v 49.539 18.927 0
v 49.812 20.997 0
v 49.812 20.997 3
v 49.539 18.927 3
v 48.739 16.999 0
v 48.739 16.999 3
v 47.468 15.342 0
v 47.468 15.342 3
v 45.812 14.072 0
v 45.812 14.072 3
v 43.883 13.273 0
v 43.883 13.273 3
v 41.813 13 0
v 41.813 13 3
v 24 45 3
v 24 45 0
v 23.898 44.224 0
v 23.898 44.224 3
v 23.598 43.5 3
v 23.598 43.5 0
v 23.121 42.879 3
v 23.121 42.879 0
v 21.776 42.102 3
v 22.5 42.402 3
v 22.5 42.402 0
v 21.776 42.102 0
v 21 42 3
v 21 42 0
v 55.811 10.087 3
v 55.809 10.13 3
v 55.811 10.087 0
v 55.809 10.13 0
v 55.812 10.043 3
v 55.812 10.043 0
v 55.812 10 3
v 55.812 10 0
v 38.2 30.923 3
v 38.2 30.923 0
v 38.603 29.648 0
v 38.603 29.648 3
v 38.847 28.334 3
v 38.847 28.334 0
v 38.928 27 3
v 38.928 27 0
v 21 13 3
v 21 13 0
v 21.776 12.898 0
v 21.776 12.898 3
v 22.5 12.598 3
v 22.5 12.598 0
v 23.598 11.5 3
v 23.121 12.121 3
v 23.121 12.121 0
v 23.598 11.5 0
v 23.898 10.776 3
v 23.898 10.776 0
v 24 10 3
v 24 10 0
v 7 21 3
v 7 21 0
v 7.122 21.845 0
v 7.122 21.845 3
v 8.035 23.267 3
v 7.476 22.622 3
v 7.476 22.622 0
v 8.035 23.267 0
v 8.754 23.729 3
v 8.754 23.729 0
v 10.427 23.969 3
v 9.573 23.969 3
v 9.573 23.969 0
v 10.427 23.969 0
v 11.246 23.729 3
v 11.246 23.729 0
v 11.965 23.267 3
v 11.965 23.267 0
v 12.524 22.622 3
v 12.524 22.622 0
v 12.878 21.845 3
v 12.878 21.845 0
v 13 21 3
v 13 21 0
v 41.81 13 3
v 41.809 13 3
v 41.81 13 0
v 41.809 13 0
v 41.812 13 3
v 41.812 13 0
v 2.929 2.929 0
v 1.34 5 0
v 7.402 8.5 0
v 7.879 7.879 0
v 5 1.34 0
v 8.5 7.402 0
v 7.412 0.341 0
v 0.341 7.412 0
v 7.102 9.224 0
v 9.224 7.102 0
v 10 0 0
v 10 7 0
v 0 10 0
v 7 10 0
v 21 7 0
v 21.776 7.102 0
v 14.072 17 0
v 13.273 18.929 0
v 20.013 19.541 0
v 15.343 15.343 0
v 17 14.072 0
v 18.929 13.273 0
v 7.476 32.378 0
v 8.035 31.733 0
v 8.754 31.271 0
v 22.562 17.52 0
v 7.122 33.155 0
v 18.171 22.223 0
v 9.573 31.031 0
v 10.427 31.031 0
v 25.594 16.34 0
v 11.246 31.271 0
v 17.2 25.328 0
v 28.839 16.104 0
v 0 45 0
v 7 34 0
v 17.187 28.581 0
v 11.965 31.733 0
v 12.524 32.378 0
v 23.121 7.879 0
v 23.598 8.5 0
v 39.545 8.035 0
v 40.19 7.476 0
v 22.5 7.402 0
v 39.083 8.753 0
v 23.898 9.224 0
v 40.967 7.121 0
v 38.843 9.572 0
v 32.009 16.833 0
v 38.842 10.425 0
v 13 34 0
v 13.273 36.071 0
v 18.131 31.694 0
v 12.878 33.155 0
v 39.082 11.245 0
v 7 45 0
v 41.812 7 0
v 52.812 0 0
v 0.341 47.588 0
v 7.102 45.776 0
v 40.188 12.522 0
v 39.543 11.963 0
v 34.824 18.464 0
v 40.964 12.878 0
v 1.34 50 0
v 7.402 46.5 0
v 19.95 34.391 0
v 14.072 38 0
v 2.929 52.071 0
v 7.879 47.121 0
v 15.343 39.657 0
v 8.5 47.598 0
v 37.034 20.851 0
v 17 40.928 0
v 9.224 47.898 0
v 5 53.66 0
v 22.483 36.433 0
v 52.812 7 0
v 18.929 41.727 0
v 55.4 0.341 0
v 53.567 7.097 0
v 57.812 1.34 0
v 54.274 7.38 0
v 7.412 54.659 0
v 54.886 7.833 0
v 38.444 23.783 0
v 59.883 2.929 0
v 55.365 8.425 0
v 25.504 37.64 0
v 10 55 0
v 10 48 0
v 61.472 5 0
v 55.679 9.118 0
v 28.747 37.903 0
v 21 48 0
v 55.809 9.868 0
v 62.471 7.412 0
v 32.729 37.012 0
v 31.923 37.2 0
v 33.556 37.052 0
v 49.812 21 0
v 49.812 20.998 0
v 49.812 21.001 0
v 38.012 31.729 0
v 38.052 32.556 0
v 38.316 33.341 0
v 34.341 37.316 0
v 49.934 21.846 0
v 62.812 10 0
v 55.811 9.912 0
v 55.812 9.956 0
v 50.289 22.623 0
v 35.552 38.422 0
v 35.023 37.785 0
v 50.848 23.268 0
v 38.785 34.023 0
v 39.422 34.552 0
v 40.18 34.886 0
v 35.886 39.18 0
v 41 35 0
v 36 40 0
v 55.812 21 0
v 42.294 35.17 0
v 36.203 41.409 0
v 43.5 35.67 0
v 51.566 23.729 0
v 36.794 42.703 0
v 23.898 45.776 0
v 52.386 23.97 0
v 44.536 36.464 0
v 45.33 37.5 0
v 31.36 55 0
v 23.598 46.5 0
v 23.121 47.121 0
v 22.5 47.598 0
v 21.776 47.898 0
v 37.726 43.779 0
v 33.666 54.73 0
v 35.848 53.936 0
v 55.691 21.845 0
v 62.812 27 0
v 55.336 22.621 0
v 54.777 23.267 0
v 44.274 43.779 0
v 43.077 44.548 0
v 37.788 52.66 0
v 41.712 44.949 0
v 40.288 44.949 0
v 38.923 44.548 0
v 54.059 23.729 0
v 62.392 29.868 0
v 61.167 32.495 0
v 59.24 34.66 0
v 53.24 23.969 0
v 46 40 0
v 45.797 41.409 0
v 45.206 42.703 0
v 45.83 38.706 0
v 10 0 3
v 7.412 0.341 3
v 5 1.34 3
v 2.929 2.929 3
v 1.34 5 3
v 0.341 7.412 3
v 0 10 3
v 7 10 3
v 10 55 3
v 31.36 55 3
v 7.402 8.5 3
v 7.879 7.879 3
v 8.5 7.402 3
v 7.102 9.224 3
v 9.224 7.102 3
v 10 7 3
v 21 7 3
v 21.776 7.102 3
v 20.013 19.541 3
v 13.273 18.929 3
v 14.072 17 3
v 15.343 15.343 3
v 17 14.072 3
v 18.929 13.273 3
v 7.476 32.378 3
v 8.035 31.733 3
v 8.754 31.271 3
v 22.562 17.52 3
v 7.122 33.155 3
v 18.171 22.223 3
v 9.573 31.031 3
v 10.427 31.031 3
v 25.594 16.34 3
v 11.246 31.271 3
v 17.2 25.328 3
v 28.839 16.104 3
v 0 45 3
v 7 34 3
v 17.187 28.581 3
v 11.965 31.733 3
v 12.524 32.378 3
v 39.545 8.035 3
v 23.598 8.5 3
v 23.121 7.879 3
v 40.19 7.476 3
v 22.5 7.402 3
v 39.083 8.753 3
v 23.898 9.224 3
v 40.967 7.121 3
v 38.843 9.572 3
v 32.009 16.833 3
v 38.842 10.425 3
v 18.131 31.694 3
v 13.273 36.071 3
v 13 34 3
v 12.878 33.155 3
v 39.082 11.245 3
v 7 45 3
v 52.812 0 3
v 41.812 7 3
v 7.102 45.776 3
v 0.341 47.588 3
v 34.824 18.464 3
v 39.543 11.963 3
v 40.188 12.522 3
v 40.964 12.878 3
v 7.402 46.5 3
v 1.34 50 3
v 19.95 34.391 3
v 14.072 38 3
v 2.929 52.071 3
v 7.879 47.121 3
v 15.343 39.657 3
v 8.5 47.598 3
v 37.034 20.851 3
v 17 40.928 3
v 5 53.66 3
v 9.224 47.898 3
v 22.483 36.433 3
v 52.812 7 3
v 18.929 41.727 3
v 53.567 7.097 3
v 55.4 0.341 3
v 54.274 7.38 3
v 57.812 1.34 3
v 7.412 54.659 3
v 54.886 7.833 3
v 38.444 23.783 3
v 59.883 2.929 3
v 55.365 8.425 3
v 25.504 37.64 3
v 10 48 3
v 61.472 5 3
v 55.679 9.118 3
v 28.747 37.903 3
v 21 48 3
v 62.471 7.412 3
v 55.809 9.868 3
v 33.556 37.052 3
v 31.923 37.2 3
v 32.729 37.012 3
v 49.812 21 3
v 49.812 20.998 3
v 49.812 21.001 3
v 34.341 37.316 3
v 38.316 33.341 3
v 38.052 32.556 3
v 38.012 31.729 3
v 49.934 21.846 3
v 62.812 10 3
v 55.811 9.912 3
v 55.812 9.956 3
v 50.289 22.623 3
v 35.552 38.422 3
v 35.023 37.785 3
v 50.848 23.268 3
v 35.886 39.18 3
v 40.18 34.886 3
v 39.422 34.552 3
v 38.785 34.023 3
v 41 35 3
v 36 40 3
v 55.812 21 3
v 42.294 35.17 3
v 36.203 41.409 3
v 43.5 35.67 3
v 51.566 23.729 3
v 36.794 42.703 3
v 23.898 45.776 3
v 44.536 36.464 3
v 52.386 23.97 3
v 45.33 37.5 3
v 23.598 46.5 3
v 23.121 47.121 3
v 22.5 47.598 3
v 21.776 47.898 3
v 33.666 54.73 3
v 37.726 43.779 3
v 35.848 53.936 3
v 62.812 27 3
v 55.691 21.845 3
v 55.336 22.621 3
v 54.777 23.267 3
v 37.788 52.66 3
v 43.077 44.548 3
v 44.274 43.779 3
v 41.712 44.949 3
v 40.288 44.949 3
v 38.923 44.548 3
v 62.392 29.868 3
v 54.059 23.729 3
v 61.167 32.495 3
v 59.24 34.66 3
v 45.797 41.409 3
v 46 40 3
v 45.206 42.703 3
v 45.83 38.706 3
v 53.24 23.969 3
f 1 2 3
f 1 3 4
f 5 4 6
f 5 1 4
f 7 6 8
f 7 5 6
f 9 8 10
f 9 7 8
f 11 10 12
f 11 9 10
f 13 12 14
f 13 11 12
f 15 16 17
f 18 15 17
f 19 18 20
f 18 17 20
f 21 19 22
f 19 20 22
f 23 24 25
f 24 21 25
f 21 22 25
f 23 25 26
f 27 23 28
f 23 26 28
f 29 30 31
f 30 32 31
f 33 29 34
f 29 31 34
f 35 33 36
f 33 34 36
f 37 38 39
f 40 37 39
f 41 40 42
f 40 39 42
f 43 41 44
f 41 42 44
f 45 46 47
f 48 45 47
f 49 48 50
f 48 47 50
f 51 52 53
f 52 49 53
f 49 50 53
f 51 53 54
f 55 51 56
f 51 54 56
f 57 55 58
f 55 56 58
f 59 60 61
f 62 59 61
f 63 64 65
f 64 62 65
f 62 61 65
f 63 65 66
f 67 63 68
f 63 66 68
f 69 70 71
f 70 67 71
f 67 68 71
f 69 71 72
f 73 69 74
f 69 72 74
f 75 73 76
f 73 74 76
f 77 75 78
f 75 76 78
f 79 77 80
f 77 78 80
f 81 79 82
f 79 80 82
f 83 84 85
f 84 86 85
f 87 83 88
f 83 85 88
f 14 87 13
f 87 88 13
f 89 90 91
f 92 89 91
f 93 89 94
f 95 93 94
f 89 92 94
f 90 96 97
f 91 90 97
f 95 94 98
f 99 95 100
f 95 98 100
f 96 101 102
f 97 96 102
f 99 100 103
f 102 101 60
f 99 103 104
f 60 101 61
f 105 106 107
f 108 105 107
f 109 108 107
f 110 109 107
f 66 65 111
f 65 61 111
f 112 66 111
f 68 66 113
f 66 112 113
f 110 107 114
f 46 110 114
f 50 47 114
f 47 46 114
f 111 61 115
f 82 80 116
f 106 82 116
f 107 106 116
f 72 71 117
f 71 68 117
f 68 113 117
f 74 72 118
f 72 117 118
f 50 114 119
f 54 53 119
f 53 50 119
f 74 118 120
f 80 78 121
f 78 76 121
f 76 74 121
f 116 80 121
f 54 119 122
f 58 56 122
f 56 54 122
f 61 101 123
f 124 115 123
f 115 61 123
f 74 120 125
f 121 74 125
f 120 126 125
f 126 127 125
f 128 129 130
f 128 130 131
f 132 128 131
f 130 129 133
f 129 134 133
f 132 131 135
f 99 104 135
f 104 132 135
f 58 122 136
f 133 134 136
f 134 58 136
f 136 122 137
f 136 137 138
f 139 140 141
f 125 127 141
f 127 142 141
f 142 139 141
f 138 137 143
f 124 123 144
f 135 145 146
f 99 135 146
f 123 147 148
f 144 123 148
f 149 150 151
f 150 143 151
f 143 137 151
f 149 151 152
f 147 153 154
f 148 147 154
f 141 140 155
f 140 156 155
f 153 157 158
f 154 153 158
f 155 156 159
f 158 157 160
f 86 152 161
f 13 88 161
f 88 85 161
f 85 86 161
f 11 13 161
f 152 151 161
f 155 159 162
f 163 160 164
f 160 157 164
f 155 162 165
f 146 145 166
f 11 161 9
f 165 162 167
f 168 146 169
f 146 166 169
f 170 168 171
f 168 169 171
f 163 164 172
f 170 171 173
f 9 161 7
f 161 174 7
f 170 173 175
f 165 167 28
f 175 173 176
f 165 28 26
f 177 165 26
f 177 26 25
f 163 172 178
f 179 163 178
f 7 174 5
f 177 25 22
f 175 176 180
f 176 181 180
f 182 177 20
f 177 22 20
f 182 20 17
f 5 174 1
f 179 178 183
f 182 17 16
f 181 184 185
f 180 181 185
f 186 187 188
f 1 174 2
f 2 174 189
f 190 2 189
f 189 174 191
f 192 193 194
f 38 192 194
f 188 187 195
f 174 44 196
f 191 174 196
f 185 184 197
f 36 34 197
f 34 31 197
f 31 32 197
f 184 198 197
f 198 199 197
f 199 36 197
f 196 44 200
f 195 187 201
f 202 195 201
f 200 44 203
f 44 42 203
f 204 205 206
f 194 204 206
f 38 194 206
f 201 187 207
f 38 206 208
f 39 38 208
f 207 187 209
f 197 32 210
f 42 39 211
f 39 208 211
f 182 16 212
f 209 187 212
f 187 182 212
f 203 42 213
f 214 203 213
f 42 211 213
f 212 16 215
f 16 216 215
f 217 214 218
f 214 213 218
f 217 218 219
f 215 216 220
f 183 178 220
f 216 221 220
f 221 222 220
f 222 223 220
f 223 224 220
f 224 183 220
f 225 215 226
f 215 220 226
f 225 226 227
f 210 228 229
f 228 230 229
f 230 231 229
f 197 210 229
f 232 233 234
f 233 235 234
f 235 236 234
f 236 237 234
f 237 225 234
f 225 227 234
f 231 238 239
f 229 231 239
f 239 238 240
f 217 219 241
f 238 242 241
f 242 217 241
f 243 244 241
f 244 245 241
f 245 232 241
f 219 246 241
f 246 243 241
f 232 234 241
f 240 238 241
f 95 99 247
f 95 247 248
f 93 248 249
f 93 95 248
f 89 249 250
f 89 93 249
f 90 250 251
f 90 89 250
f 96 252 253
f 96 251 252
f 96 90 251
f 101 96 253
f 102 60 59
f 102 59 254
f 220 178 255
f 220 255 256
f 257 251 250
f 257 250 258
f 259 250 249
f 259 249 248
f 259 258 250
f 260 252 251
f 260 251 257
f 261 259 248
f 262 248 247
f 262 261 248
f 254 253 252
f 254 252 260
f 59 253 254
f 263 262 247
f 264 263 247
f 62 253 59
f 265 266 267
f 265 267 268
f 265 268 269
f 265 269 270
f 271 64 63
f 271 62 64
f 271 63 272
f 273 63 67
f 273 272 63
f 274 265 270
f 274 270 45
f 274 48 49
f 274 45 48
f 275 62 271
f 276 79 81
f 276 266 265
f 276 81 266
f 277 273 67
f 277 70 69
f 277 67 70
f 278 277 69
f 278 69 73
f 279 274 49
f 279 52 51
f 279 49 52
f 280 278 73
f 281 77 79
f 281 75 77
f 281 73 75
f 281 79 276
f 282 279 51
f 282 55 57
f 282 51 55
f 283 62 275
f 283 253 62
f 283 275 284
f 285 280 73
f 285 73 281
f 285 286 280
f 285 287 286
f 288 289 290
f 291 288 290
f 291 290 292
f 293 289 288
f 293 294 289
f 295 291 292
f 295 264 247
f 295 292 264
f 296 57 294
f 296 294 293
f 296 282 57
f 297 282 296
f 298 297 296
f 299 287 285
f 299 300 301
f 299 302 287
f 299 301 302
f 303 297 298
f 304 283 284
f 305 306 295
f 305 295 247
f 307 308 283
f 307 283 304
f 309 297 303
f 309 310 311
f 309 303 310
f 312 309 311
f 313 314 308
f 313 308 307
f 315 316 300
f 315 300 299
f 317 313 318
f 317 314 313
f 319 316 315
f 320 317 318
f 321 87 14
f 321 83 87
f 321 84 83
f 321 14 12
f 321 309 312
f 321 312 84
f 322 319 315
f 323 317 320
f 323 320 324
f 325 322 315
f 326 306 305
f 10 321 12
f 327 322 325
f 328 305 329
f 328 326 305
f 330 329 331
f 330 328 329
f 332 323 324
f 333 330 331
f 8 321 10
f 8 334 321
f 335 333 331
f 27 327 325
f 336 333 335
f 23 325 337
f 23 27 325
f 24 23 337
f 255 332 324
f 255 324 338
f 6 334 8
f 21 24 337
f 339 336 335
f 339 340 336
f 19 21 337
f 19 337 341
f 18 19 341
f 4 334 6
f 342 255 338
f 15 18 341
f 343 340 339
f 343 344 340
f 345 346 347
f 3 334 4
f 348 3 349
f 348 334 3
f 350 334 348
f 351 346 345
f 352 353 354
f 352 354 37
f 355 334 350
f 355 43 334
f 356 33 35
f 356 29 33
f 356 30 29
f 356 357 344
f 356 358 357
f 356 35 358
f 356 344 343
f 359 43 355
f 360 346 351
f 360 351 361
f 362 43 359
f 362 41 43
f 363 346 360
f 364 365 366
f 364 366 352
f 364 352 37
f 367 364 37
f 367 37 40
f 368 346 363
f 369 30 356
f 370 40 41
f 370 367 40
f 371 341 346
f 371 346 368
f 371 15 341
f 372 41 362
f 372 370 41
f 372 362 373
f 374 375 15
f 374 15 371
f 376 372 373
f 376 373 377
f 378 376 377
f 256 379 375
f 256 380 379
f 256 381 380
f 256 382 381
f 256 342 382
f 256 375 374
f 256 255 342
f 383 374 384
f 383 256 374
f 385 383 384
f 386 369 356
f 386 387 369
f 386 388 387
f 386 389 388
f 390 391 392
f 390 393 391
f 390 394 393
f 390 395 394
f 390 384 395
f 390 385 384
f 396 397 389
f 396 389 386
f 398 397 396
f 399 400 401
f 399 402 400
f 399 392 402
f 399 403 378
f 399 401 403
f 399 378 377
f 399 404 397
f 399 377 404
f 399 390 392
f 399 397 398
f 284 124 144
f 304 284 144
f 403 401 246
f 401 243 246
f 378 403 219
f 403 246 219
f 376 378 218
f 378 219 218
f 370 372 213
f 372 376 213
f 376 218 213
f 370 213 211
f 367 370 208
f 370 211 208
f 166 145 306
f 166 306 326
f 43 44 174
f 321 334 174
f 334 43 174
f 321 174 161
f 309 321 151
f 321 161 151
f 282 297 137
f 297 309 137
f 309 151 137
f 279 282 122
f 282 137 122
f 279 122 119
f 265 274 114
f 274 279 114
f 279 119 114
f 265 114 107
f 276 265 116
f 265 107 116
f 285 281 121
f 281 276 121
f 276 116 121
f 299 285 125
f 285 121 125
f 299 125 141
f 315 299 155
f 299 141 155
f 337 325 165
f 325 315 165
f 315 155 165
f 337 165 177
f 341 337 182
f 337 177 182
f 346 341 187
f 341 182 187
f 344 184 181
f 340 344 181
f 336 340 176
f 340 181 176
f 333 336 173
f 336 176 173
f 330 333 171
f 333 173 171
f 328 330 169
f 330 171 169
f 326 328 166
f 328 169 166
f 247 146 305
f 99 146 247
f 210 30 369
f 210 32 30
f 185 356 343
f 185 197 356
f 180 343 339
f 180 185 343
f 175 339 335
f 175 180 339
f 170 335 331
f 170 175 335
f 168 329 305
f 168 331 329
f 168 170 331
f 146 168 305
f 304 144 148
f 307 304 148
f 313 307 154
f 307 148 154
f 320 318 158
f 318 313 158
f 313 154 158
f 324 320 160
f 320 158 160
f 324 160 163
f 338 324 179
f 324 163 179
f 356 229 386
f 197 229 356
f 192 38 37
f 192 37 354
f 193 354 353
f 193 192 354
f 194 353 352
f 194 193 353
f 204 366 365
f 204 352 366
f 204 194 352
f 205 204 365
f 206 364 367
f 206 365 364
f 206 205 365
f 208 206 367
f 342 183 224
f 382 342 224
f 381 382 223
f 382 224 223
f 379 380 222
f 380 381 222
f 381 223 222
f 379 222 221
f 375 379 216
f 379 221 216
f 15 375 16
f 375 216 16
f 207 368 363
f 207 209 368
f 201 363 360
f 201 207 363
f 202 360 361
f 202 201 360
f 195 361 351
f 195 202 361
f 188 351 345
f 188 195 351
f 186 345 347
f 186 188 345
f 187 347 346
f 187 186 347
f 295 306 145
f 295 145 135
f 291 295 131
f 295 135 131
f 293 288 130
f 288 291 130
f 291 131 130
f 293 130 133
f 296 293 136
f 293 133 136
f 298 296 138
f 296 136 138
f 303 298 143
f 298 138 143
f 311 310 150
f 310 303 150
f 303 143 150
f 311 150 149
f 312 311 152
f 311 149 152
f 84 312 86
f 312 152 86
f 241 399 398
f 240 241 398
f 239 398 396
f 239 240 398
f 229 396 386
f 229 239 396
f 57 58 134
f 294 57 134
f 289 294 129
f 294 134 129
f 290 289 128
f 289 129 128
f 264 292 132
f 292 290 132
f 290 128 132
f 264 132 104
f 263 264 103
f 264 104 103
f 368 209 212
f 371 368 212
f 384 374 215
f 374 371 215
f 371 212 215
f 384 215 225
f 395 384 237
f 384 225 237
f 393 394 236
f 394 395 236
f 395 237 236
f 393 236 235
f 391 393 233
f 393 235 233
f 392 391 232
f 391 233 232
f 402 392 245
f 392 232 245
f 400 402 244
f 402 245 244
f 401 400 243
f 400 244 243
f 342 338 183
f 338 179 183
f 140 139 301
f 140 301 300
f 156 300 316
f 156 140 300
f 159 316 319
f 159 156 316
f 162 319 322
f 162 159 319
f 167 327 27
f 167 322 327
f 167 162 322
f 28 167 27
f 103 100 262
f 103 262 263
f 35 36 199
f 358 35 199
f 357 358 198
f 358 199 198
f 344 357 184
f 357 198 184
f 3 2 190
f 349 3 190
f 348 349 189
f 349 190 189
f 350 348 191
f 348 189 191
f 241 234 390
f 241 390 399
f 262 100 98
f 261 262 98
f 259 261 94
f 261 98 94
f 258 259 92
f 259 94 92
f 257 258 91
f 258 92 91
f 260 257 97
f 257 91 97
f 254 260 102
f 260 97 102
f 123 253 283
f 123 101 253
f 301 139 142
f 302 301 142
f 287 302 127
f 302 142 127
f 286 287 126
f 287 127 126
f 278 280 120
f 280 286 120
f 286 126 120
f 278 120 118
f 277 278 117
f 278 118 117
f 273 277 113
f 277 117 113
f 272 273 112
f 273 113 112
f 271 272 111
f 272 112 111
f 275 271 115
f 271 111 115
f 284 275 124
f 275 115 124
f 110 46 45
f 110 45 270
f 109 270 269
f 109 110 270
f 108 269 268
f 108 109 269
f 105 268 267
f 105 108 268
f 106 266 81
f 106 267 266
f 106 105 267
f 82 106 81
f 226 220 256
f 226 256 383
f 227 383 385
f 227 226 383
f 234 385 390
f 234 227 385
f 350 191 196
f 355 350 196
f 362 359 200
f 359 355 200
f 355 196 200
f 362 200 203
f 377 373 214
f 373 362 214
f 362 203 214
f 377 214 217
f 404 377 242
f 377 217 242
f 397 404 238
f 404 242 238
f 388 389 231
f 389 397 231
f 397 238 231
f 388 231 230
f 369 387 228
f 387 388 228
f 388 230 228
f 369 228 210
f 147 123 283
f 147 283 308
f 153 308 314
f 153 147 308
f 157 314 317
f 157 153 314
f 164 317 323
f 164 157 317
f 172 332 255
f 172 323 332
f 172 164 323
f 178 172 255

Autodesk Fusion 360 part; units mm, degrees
sketch "Sketch3" plane through (0, 0, 0) normal (0, 0, 1) x (1, 0, 0)
  line L0 (0, 10) -> (0, 45)
  line L1 (10, 55) -> (31.3603, 55)
  line L2 (52.8119, 0) -> (10, 0)
  line L3 (62.8119, 27) -> (52.8119, 27) construction
  line L4 (62.8119, 27) -> (62.8119, 10)
  line L5 (37.7882, 52.6604) -> (59.2397, 34.6604)
  arc A0 (62.8119, 27) -> (59.2397, 34.6604) centre (52.8119, 27) ccw
  arc A1 (37.7882, 52.6604) -> (31.3603, 55) centre (31.3603, 45) ccw
  arc A2 (10, 55) -> (0, 45) centre (10, 45) ccw
  arc A3 (52.8119, 0) -> (62.8119, 10) centre (52.8119, 10) ccw
  arc A4 (0, 10) -> (10, 0) centre (10, 10) ccw
  line L6 (0, 27) -> (28, 27) construction
  line L7 (0, 40) -> (41, 40) construction
  circle A5 centre (41, 40) radius 5
  circle A6 centre (10, 10) radius 3
  circle A7 centre (21, 10) radius 3
  circle A8 centre (10, 21) radius 3
  line L8 (7, 21) -> (7, 10)
  line L9 (10, 7) -> (21, 7)
  arc A9 (13, 21) -> (21, 13) centre (21, 21) ccw
  circle A10 centre (52.8119, 10) radius 3
  circle A11 centre (41.8119, 10) radius 3
  circle A12 centre (52.8119, 21) radius 3
  line L10 (41.8119, 7) -> (52.8119, 7)
  line L11 (55.809, 9.8683) -> (55.8119, 20.9992)
  line L12 (49.8119, 21.0011) -> (49.8119, 20.9971)
  line L13 (41.809, 13) -> (41.8129, 13)
  arc A13 (41.809, 13) -> (49.8119, 20.9971) centre (41.8119, 21) ccw
  circle A14 centre (10, 45) radius 3
  circle A15 centre (21, 45) radius 3
  circle A16 centre (10, 34) radius 3
  line L14 (7, 34) -> (7, 45)
  line L15 (10, 48) -> (21, 48)
  line L16 (21, 42) -> (21, 42)
  arc A17 (21, 42) -> (13, 34) centre (21, 34) ccw
  line L17 (41, 40) -> (41, 32) construction
  line L18 (41, 40) -> (33, 40) construction
  circle A18 centre (28, 27) radius 10.9284
  arc A19 (31.9231, 37.2) -> (36, 40) centre (33, 40) ccw
  arc A20 (41, 35) -> (38.2, 30.9231) centre (41, 32) ccw
  point P0 (0, 55)
  point P1 (60, 55)
  point P2 (35, 55)
  dimension "d35" = 55
  dimension "d36" = 60
  dimension "d37" = 25
  dimension "d39" = 10
  dimension "d40" = 28
  dimension "d41" = 20
  dimension "d42" = 140
  dimension "d43" = 10
  dimension "d44" = 10
  dimension "d45" = 10
  dimension "d46" = 10
  dimension "d51" = 28
  dimension "d52" = 28
  dimension "d53" = 41
  dimension "d54" = 15
  dimension "d55" = 10
  dimension "d56" = 6
  dimension "d57" = 6
  dimension "d58" = 6
  dimension "d60" = 55
  dimension "d62" = 11
  dimension "d63" = 11
  dimension "d64" = 8
  dimension "d65" = 6
  dimension "d66" = 6
  dimension "d67" = 6
  dimension "d68" = 8
  dimension "d69" = 11
  dimension "d70" = 11
  dimension "d71" = 6
  dimension "d72" = 6
  dimension "d73" = 6
  dimension "d74" = 11
  dimension "d75" = 11
  dimension "d76" = 8
  dimension "d79" = 8
  dimension "d80" = 8
extrude "Extrude3" add sketch "Sketch3" along normal blind 3
